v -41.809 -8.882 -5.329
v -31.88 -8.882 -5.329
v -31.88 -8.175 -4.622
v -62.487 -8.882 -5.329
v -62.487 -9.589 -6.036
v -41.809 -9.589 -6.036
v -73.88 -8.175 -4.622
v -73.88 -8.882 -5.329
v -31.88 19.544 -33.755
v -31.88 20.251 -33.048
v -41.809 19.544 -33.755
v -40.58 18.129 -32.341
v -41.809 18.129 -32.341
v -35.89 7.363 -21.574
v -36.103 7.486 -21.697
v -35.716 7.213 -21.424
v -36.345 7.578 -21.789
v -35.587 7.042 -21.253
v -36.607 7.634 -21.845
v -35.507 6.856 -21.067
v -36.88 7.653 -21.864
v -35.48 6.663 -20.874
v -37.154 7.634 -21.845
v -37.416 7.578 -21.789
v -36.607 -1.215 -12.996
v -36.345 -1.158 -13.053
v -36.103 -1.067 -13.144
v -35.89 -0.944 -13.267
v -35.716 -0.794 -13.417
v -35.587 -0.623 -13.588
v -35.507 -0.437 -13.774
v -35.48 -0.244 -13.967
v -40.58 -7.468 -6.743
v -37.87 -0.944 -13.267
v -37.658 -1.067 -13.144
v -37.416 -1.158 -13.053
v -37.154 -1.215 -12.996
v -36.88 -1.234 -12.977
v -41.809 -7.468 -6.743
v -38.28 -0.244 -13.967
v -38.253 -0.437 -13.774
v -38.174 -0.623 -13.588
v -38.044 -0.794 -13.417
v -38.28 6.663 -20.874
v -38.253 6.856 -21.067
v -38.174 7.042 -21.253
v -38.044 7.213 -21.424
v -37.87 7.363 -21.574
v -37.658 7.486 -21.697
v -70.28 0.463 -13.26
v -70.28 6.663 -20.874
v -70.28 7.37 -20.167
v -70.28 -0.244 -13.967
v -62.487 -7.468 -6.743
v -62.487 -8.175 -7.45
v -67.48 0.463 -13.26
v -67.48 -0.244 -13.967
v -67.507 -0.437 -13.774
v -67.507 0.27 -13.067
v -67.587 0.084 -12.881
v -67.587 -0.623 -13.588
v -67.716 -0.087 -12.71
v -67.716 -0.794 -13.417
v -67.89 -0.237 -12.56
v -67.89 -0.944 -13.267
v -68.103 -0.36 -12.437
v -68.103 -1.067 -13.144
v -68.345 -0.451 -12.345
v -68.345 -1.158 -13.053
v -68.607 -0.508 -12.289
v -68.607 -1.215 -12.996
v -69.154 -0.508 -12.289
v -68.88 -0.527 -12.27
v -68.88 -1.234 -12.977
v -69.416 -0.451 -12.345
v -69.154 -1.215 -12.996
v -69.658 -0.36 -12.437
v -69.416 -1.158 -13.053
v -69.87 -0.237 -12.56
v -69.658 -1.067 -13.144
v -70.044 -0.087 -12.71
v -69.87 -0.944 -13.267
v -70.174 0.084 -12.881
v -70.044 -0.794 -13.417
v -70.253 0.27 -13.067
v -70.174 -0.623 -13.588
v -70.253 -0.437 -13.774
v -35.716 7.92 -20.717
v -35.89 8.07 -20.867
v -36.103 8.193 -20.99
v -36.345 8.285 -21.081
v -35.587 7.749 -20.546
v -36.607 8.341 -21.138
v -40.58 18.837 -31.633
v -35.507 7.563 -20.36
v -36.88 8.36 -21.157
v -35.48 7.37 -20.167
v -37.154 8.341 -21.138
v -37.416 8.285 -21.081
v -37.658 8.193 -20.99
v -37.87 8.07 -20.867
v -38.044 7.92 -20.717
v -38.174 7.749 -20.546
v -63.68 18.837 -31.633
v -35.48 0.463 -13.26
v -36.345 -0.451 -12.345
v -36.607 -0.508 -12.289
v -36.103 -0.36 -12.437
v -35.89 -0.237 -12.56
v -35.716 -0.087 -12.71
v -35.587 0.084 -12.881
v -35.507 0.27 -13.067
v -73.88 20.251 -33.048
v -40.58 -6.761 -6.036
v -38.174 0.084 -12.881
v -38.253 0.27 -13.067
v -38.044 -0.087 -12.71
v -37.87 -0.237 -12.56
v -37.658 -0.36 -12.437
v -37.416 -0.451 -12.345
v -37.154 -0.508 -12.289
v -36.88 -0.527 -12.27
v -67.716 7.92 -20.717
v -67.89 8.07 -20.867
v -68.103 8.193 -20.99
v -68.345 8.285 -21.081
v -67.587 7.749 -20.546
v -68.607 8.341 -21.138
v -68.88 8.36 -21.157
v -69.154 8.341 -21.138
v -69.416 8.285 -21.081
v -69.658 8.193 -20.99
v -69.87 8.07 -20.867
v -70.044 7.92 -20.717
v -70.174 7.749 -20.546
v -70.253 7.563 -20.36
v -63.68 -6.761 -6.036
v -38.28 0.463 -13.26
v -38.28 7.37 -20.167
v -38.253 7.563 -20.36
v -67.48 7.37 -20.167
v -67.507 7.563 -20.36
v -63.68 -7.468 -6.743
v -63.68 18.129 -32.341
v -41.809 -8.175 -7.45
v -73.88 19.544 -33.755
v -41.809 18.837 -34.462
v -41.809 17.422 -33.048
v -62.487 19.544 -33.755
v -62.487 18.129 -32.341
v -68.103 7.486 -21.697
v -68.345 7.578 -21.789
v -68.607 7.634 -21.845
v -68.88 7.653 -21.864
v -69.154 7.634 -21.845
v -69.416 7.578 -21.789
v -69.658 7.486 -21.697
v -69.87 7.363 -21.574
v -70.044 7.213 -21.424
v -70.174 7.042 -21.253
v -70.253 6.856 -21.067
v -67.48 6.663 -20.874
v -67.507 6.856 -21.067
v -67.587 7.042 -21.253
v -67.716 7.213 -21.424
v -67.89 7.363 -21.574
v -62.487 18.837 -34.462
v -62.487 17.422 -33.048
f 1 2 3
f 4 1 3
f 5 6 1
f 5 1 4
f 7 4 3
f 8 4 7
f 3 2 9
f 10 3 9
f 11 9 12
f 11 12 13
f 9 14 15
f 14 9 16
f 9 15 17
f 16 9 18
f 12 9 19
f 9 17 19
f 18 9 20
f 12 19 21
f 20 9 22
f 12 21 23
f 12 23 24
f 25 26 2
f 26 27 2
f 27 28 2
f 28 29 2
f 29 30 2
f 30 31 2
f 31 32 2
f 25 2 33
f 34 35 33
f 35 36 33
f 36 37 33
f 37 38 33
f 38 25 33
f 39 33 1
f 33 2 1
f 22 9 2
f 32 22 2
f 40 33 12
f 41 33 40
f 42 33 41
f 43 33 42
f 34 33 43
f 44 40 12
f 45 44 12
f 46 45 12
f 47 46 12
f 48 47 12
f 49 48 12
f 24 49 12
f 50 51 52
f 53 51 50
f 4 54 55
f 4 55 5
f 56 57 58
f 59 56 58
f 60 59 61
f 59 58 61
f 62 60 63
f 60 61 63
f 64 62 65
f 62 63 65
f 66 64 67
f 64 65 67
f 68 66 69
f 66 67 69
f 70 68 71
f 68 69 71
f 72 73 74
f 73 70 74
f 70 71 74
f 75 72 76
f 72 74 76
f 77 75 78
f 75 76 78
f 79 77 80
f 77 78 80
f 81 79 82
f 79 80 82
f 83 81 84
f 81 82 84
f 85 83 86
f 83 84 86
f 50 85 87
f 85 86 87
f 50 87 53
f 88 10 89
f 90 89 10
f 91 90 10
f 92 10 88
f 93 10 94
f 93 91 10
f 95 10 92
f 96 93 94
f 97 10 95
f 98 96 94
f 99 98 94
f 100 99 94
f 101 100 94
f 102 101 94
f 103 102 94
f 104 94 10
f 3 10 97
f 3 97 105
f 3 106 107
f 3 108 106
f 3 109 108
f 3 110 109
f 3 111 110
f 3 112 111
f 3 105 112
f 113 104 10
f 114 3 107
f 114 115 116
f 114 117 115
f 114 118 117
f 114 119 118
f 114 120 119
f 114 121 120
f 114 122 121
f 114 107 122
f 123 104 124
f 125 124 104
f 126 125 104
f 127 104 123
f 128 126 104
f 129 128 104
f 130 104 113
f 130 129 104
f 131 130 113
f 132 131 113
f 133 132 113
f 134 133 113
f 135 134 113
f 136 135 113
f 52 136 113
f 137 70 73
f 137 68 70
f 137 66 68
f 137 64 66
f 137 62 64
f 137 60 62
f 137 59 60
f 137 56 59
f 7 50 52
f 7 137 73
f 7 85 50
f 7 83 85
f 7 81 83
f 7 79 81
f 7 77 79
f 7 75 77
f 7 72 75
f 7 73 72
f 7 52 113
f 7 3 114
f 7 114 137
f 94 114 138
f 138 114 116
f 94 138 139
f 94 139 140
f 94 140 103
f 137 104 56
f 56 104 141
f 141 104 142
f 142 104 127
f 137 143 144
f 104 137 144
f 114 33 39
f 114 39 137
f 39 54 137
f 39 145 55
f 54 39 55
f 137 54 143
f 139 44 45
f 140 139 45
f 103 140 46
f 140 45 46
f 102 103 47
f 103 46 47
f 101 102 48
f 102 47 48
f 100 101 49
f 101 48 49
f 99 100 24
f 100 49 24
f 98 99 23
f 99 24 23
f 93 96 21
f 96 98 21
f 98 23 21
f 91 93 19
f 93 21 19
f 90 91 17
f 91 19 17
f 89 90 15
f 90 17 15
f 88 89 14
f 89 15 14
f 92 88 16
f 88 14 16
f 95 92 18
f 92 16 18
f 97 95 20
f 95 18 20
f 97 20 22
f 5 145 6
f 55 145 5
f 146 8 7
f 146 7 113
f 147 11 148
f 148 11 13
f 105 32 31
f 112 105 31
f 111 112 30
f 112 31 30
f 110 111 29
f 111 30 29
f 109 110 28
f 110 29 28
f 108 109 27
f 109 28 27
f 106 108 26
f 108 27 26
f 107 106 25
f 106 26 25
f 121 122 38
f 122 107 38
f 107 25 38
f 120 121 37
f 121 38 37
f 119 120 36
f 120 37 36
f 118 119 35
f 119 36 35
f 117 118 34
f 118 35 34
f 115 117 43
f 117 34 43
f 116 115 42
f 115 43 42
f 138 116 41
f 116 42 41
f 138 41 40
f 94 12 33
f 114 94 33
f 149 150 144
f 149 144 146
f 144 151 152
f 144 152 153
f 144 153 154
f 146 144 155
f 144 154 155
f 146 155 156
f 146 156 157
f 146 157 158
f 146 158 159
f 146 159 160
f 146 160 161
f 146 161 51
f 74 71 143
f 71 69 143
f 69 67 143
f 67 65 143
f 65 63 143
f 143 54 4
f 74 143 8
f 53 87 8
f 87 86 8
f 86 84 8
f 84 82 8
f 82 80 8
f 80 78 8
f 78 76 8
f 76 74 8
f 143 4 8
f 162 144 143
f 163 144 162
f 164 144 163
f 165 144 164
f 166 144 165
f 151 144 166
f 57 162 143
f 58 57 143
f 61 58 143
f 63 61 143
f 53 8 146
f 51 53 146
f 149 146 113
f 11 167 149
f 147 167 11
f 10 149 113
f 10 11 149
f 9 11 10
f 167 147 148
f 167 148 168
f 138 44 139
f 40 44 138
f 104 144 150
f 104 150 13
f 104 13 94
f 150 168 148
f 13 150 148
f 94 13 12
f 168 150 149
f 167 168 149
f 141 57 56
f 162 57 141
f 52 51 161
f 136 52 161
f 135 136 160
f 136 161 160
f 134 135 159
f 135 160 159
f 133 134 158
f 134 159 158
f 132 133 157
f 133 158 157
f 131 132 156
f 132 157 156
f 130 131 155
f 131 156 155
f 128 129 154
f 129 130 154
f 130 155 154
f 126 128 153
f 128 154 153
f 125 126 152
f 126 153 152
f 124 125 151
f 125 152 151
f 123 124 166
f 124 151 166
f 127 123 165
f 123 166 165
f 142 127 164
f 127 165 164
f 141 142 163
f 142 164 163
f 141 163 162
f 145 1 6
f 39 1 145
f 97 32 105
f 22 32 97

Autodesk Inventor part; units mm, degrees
ref_plane "YZ Plane" through (0, 0, 0) normal (1, 0, 0) x (0, 1, 0)
ref_plane "XZ Plane" through (0, 0, 0) normal (0, 1, 0) x (-1, 0, 0)
ref_plane "XY Plane" through (0, 0, 0) normal (0, 0, 1) x (1, 0, 0)
ref_plane "Work Plane2" through (-65.3804, 18.9113, -35.9508) normal (-1, 0, 0) x (0, -0.7071, -0.7071)
ref_plane "Work Plane3" through (-52.8804, 7.2095, -21.4206) normal (0, 0.7071, 0.7071) x (-1, 0, 0)
sketch "Sketch3" plane through (-52.8804, 7.2095, -21.4206) normal (0, 0.7071, 0.7071) x (-1, 0, 0)
  circle A0 centre (16, 5.6569) radius 1.4 construction
  circle A1 centre (-16, 5.6569) radius 1.4 construction
  line L0 (-16.9, -3.0998) -> (-16.9, -27) construction
  line L1 (14.3, 19.8) -> (12.8, 19.8) construction
  line L2 (14.3, 19.8) -> (14.3, -19.254) construction
  line L3 (12.8, 19.8) -> (12.8, -18.254) construction
  line L4 (-12.8, -18.254) -> (-12.8, 19.8) construction
  line L5 (-12.8, 19.8) -> (-14.3, 19.8) construction
  line L6 (-14.3, 19.8) -> (-14.3, -18.254) construction
  line L7 (12.8, -18.254) -> (-12.8, -18.254) construction
  line L8 (-12.5, -18.5487) -> (12.5, -18.5487) construction
  line L9 (18, -17.4431) -> (-18, -17.4431)
  line L10 (-18, -17.4431) -> (-18, 22.7569)
  line L11 (-18, 22.7569) -> (18, 22.7569)
  line L12 (18, 22.7569) -> (18, -17.4431)
  line L13 (10.8, -15.4431) -> (-12.3, -15.4431)
  line L14 (-12.3, -15.4431) -> (-12.3, 20.7569)
  line L15 (-12.3, 20.7569) -> (10.8, 20.7569)
  line L16 (10.8, 20.7569) -> (10.8, -15.4431)
  circle A2 centre (16, 5.6569) radius 1.4
  circle A3 centre (-16, 5.6569) radius 1.4
  line L17 (16, 10.5407) -> (16, 0.773) construction
  line L18 (14.6, 10.5407) -> (14.6, 0.773)
  line L19 (17.4, 0.773) -> (17.4, 10.5407)
  arc A4 (17.4, 10.5407) -> (14.6, 10.5407) centre (16, 10.5407) ccw
  arc A5 (14.6, 0.773) -> (17.4, 0.773) centre (16, 0.773) ccw
  line L20 (-16, 10.5407) -> (-16, 0.773) construction
  line L21 (-17.4, 10.5407) -> (-17.4, 0.773)
  line L22 (-14.6, 0.773) -> (-14.6, 10.5407)
  arc A6 (-14.6, 10.5407) -> (-17.4, 10.5407) centre (-16, 10.5407) ccw
  arc A7 (-17.4, 0.773) -> (-14.6, 0.773) centre (-16, 0.773) ccw
  point P0 (-52.8804, 20.2446)
  dimension "d12" = 2
  dimension "d13" = 2
  dimension "d14" = 23.1
  dimension "d15" = 17.1
  dimension "d16" = 2
  dimension "d17" = 2
  dimension "d18" = 2
  dimension "d19" = 2
extrude "Extrusion3" add sketch "Sketch3" along normal blind 1
sketch "Sketch4" plane through (-52.8804, 7.2095, -21.4206) normal (0, -0.7071, -0.7071) x (-1, 0, 0)
  line L0 (-12.3, 15.4431) -> (-12.3, -20.7569) projected
  line L1 (-12.3, -20.7569) -> (10.8, -20.7569) projected
  line L2 (10.8, -20.7569) -> (10.8, 15.4431) projected
  line L3 (10.8, 15.4431) -> (-12.3, 15.4431) projected
  line L4 (-18, 17.4431) -> (18, 17.4431) projected
  line L5 (18, 17.4431) -> (18, -22.7569) projected
  line L6 (18, -22.7569) -> (-18, -22.7569) projected
  line L7 (-18, -22.7569) -> (-18, 17.4431) projected
  line L8 (-18, 17.4431) -> (18, 17.4431) projected
  line L9 (-12.3, 15.4431) -> (10.8, 15.4431) projected
  line L10 (9.607, 17.4431) -> (-11.0714, 17.4431)
  line L11 (-11.0714, 17.4431) -> (-11.0714, 15.4431)
  line L12 (-11.0714, 15.4431) -> (9.607, 15.4431)
  line L13 (9.607, 15.4431) -> (9.607, 17.4431)
  line L14 (10.8, -20.7569) -> (-12.3, -20.7569) projected
  line L15 (9.607, -22.7569) -> (-11.0714, -22.7569)
  line L16 (-11.0714, -22.7569) -> (-11.0714, -20.7569)
  line L17 (-11.0714, -20.7569) -> (9.607, -20.7569)
  line L18 (9.607, -20.7569) -> (9.607, -22.7569)
  point P0 (-52.8804, -20.2446)
extrude "Extrusion4" add sketch "Sketch4" along normal blind 1 contours L11 L4 L13 L3 | L1 L18 L6 L16
sketch "Sketch5" plane through (-52.8804, 7.2095, -21.4206) normal (0, -0.7071, -0.7071) x (-1, 0, 0)
  line L0 (-18, 17.4431) -> (18, 17.4431) projected
  line L1 (18, -22.7569) -> (-18, -22.7569) projected
  line L2 (-18, -22.7569) -> (-21, -22.7569)
  line L3 (-21, -22.7569) -> (-21, 17.4431)
  line L4 (-21, 17.4431) -> (-18, 17.4431)
  line L5 (-18, 17.4431) -> (-18, -22.7569)
  line L6 (18, -22.7569) -> (21, -22.7569)
  line L7 (21, -22.7569) -> (21, 17.4431)
  line L8 (21, 17.4431) -> (18, 17.4431)
  line L9 (18, 17.4431) -> (18, -22.7569)
  point P0 (-52.8804, -20.2446)
  dimension "d24" = 3
  dimension "d25" = 3
  dimension "d28" = 40.2
extrude "Extrusion5" add sketch "Sketch5" against normal up to surface (1 mm away) contours L5 L2 L3 L4 | L8 L7 L6 L9
properties part number "20_Cube_Insert_Beamsplittercube_Dichroicmirror_Retainplate"
